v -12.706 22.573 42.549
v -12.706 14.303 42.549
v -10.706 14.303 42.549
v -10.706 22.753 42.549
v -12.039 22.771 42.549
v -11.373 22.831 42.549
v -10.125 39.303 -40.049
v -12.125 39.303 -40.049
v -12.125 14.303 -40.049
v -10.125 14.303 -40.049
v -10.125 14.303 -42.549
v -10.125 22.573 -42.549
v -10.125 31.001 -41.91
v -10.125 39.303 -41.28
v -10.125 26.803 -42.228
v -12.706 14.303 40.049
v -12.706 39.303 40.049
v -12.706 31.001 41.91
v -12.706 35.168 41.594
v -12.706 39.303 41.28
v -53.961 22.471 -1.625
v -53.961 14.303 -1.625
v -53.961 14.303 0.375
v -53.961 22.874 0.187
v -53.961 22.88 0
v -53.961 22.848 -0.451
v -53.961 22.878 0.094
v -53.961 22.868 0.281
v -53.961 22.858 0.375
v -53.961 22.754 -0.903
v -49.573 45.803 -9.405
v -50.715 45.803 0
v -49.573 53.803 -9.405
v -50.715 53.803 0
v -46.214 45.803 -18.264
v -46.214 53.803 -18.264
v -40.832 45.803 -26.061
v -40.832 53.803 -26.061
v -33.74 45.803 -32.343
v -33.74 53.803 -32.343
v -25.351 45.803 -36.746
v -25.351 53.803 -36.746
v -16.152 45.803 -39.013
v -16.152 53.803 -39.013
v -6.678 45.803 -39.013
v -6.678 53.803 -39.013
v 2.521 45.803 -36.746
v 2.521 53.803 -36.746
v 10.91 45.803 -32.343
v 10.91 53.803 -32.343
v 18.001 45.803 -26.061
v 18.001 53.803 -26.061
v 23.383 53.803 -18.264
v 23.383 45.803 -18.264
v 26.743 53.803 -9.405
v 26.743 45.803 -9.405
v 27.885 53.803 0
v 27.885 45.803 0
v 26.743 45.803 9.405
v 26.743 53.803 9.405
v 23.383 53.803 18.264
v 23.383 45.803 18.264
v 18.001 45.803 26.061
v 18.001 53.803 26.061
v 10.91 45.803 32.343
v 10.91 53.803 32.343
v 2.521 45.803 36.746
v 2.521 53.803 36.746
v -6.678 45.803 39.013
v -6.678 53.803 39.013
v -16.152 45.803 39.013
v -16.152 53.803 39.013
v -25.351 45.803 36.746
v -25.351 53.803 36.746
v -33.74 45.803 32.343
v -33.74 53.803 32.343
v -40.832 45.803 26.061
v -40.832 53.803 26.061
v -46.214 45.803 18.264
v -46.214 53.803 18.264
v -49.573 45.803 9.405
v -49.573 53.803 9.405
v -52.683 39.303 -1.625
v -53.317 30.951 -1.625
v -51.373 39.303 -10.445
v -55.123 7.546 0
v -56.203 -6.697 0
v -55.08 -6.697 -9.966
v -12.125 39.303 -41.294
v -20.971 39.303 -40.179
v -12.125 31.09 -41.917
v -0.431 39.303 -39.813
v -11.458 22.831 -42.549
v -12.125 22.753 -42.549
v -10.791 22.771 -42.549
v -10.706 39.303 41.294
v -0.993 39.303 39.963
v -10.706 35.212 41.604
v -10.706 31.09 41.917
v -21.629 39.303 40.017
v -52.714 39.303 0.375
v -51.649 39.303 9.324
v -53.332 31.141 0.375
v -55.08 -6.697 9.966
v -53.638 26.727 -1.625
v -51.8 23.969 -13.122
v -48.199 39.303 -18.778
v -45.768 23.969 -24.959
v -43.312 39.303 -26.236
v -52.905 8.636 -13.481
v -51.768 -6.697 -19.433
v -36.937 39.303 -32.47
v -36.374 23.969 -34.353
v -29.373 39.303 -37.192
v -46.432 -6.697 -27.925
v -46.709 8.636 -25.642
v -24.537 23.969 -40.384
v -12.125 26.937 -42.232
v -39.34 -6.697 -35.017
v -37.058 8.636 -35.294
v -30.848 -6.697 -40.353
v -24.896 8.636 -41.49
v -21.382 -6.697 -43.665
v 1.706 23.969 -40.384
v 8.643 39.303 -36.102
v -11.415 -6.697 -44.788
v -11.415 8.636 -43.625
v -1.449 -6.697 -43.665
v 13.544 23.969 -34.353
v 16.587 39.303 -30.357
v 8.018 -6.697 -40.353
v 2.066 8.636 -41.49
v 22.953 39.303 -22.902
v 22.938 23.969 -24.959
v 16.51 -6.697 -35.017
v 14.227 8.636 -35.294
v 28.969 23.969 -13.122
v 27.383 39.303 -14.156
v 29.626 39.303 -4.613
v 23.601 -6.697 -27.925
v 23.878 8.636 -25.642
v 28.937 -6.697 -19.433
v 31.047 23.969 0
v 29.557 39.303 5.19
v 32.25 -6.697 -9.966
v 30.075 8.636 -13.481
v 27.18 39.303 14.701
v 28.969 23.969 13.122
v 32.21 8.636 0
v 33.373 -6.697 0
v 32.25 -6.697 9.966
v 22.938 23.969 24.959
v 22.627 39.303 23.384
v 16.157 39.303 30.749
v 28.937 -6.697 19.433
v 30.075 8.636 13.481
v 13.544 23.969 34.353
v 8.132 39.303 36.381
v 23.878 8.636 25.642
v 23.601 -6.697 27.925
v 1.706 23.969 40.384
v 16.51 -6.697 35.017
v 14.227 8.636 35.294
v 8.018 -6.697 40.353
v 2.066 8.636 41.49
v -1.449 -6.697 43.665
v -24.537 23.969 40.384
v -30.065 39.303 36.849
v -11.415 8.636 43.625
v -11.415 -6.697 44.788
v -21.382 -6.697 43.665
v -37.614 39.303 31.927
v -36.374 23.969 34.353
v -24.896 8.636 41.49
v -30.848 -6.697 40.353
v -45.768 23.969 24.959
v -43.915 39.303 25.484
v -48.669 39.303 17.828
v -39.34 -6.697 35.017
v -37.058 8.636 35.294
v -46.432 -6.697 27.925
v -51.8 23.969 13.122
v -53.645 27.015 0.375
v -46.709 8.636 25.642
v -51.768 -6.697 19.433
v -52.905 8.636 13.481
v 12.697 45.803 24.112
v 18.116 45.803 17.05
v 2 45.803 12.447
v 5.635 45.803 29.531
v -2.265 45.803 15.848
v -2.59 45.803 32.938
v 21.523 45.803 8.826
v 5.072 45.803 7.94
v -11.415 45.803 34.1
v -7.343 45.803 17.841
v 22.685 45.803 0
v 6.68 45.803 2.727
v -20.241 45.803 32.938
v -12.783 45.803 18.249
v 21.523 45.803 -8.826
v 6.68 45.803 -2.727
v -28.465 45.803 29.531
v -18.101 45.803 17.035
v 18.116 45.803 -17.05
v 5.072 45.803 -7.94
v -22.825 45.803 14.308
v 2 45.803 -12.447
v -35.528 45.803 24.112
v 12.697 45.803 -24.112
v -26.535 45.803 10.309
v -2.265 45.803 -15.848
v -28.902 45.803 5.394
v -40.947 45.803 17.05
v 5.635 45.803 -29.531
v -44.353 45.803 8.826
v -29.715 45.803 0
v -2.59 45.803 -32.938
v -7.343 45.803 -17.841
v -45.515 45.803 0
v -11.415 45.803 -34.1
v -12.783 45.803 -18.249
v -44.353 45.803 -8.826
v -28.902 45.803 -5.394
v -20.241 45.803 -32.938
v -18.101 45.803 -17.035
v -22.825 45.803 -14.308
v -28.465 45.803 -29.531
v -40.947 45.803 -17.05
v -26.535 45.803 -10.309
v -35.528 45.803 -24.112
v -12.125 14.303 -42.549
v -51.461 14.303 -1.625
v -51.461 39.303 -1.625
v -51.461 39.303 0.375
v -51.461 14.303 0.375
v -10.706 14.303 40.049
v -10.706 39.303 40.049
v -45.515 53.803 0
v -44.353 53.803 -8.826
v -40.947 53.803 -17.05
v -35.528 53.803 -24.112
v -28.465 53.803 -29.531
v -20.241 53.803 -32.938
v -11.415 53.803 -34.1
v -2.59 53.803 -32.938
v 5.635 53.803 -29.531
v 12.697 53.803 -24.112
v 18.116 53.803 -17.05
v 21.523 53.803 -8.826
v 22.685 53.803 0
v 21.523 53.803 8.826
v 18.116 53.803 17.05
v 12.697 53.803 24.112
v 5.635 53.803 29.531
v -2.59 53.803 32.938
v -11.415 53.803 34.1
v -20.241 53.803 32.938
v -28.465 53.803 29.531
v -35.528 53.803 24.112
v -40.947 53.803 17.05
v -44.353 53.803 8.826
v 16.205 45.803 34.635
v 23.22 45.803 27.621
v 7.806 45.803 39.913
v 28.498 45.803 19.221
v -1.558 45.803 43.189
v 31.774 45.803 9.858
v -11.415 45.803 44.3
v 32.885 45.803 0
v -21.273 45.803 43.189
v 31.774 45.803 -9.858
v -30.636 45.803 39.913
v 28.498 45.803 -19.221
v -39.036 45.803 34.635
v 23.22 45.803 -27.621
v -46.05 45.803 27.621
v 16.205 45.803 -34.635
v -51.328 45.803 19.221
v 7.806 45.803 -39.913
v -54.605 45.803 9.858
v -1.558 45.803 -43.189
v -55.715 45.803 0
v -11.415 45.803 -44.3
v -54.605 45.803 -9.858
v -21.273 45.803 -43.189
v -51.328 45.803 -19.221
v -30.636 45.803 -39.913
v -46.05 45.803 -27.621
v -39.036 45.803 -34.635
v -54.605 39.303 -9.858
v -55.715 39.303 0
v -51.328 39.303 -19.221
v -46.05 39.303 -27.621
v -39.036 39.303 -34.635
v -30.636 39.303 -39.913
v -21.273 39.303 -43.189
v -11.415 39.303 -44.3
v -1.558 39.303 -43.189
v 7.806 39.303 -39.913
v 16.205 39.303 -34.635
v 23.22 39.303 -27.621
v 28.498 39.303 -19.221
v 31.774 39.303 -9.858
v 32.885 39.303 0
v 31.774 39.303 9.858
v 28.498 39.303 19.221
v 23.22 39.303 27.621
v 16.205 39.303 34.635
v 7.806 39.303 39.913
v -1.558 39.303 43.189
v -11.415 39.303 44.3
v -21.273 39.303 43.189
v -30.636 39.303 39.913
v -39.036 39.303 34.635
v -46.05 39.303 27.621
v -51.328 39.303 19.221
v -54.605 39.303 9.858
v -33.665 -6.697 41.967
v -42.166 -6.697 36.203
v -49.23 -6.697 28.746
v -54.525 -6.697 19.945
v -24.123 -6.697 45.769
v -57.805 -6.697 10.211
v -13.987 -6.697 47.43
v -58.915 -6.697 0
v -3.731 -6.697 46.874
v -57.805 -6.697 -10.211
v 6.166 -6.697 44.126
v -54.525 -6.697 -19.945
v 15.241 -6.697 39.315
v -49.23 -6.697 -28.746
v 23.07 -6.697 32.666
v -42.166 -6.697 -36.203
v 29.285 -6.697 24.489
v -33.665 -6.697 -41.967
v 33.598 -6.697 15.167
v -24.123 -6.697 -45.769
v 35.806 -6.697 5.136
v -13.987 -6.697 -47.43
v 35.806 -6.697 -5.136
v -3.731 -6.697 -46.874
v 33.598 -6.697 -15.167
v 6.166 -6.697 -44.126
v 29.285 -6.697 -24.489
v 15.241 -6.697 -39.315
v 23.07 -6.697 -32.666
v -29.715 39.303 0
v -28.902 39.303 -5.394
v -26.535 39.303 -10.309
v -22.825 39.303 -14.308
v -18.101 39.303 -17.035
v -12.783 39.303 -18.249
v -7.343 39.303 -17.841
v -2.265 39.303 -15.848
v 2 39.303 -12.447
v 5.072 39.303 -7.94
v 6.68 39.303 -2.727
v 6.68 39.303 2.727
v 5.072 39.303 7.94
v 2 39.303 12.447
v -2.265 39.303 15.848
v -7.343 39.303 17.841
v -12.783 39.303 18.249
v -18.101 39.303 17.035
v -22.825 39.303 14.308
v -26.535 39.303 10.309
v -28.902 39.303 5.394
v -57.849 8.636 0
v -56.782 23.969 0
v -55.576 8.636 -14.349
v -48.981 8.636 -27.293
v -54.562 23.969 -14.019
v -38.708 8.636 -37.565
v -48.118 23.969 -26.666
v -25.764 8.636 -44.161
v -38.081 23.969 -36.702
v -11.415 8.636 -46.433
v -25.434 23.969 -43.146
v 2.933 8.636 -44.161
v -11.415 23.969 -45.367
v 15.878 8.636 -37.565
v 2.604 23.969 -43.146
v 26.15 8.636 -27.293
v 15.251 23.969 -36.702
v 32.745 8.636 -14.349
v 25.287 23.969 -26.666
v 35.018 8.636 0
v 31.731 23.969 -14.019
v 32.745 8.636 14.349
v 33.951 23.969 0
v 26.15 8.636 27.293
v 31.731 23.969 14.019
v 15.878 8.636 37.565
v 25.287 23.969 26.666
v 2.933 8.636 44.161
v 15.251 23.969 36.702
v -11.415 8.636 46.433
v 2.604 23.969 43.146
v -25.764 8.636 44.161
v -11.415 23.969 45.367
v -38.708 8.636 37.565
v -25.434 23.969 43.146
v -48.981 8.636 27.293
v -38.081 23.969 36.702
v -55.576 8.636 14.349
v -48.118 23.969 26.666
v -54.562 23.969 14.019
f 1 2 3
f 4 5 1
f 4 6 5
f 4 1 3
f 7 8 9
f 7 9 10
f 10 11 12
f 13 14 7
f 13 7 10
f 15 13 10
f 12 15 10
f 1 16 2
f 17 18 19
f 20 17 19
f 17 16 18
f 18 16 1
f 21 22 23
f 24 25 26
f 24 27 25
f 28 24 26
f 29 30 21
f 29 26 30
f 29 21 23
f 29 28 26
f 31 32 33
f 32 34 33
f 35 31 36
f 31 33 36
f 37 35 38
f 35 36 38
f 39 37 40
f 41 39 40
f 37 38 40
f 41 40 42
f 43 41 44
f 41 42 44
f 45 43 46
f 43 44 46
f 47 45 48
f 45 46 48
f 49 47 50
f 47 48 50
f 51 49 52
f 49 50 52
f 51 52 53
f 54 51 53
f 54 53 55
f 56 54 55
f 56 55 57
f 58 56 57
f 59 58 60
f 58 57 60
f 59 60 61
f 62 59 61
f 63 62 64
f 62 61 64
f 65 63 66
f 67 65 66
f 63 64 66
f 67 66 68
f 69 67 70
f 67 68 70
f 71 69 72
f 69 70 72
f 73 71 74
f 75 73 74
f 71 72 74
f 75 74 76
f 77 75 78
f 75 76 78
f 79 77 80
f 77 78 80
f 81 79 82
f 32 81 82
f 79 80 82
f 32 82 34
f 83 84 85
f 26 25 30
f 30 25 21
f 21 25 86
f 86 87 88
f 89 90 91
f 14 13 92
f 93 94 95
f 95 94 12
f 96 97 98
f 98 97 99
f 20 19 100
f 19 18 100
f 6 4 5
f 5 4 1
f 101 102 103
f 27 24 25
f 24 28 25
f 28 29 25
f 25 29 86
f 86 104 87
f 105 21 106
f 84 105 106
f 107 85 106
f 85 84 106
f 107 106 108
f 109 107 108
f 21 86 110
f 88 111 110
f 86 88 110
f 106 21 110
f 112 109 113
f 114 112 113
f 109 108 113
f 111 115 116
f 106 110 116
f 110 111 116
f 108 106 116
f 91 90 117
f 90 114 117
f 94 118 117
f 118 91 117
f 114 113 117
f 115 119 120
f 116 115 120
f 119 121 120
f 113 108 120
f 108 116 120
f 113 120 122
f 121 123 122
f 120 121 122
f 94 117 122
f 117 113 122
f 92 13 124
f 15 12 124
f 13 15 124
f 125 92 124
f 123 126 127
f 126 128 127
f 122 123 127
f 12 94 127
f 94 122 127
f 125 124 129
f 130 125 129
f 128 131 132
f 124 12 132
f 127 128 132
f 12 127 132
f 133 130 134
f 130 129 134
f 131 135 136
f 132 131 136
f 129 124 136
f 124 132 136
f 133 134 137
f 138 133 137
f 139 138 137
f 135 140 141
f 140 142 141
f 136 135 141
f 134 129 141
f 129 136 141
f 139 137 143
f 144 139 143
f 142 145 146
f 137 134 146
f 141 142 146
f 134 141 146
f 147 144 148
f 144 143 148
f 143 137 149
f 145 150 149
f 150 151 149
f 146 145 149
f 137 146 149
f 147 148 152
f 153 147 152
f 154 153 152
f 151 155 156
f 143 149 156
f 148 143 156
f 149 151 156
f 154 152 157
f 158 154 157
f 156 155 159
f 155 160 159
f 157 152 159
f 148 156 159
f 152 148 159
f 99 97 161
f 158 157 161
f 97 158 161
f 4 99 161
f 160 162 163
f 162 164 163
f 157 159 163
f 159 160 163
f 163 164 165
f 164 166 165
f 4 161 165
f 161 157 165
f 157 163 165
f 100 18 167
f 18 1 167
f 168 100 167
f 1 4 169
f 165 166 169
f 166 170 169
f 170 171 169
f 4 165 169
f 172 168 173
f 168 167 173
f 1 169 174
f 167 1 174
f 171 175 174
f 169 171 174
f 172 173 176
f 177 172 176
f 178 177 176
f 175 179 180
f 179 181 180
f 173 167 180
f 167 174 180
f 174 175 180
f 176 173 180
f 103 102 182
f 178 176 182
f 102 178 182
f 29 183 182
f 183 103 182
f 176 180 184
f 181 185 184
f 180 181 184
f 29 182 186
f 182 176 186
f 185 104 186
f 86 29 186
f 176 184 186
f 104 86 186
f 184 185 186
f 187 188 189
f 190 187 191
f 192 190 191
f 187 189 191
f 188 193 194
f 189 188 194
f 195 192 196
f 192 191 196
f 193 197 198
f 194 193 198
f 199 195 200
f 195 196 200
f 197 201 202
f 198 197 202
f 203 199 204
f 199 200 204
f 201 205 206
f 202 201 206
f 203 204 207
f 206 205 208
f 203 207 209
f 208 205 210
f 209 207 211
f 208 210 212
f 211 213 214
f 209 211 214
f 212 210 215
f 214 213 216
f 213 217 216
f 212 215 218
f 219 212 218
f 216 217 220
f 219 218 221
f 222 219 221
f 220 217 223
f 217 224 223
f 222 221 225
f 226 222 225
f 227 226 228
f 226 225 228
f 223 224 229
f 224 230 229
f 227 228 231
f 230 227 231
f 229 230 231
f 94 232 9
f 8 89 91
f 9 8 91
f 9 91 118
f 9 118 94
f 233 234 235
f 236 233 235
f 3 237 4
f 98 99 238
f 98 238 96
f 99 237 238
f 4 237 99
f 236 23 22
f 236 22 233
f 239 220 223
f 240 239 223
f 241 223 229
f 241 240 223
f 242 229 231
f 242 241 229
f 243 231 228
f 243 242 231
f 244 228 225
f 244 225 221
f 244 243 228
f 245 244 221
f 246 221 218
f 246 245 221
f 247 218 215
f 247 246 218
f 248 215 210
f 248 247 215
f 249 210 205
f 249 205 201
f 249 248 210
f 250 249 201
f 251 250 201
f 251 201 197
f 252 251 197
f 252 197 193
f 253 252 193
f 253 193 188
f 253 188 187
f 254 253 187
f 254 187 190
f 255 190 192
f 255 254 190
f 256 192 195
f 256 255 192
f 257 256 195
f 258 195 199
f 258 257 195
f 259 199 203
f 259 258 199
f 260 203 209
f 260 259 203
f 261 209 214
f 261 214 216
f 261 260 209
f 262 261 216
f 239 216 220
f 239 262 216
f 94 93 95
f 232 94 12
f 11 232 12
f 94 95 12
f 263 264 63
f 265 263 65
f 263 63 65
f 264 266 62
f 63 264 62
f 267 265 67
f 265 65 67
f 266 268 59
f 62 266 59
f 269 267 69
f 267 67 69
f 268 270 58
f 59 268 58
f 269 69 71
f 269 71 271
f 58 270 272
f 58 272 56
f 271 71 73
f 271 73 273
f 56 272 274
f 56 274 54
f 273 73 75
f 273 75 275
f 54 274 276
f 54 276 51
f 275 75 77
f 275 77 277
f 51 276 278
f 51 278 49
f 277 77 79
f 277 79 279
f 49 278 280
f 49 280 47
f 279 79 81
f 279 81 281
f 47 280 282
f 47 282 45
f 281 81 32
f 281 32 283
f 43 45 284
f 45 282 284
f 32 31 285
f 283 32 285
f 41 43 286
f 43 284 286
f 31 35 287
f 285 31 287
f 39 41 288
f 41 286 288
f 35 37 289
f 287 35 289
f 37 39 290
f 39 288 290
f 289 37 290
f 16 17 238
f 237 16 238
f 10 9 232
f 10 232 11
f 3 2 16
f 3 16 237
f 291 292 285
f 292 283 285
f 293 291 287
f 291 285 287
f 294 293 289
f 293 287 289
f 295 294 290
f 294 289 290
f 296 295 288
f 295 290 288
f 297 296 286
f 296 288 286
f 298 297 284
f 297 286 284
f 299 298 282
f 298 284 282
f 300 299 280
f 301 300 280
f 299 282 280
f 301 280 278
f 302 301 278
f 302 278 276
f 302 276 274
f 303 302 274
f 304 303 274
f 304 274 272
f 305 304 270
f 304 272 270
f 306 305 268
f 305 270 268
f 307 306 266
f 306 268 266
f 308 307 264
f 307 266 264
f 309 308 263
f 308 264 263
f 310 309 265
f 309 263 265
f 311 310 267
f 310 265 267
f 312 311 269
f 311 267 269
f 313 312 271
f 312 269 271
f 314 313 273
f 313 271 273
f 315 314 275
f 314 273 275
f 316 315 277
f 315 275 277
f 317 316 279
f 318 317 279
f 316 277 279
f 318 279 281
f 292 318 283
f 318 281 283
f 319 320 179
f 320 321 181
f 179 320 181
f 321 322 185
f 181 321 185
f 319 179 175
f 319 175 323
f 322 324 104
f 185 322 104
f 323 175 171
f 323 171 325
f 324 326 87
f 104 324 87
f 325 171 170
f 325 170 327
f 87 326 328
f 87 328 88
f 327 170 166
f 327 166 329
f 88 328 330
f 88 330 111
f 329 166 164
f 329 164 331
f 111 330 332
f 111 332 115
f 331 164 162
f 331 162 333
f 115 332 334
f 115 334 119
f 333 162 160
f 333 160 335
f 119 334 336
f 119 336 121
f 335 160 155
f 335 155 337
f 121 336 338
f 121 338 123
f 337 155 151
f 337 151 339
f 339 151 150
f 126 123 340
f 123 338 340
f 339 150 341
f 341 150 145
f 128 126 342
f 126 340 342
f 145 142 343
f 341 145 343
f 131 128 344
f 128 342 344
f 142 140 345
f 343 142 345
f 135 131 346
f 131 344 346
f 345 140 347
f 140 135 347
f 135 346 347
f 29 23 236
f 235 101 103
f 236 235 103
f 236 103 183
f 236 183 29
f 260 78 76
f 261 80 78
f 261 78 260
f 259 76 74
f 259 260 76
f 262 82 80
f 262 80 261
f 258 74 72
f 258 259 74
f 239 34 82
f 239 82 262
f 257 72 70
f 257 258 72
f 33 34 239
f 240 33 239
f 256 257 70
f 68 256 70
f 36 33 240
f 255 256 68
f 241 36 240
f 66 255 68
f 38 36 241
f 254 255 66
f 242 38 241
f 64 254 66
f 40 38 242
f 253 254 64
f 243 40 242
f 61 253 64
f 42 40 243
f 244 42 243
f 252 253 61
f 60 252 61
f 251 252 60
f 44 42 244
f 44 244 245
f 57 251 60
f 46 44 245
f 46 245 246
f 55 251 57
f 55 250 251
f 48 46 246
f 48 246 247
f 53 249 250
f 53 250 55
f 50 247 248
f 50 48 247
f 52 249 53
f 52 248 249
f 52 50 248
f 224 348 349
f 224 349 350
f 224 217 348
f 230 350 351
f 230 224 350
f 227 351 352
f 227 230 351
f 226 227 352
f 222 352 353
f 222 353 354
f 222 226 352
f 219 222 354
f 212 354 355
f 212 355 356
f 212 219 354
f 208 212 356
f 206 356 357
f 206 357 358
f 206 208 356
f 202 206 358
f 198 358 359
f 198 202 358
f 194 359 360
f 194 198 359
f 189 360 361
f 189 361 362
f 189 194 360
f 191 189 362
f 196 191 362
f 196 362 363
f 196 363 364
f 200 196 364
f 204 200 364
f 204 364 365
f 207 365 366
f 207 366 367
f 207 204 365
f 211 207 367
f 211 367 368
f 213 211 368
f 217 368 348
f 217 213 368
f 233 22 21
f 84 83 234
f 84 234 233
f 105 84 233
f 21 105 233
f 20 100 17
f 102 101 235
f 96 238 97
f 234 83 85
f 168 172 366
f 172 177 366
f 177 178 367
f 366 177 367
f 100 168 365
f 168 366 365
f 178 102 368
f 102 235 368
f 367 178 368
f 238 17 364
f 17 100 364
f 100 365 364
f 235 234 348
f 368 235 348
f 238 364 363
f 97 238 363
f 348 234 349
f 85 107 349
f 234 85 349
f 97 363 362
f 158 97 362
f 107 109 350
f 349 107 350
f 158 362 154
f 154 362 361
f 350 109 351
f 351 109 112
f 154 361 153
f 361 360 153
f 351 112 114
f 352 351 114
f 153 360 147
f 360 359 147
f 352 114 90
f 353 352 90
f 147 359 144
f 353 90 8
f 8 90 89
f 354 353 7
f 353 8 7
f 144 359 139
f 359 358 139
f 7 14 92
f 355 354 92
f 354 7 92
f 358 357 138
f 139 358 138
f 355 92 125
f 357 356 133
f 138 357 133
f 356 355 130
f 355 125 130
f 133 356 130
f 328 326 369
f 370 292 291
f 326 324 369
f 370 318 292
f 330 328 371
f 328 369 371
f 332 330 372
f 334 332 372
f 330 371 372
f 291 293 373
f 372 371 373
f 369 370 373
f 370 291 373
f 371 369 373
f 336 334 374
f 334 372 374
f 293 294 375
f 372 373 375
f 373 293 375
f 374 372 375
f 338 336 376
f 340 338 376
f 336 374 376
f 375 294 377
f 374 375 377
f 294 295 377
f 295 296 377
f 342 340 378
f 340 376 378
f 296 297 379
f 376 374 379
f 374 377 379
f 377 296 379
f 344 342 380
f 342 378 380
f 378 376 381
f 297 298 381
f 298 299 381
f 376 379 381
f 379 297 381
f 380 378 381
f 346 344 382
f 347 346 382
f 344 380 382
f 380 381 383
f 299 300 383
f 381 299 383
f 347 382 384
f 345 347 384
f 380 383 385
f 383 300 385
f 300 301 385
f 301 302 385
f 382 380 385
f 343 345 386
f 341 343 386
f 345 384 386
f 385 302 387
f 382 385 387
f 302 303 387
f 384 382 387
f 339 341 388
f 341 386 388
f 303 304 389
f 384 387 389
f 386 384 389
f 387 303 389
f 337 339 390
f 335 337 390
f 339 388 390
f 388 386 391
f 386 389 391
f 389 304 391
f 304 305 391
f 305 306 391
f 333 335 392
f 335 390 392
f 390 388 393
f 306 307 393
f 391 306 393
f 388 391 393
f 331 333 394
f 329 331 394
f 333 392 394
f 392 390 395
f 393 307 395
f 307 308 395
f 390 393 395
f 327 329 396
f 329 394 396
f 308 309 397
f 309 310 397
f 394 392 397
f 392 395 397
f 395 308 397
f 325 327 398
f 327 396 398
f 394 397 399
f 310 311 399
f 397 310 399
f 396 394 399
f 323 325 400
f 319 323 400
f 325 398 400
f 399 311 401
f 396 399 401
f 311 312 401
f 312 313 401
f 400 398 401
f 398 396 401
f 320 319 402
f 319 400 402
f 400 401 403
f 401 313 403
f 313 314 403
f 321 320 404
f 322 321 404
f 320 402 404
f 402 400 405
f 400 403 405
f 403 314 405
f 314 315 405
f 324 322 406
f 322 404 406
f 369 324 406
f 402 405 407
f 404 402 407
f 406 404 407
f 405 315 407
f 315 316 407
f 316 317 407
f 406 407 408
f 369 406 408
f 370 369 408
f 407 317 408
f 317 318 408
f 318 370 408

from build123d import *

# Parameters (mm, degrees)
ESQUISSE1_W        = 15.8
ESQUISSE1_H        = 6.5
ESQUISSE1_W_2      = 5.2
ESQUISSE1_H_2      = 8
ESQUISSE2_W        = 2
ESQUISSE2_H        = 2.5
BOSS_EXTRU_2_DEPTH = 25
ESQUISSE3_W        = 2.5
ESQUISSE3_H        = 2
ESQUISSE3_W_2      = 2
ESQUISSE3_H_2      = 2.5
BOSS_EXTRU_3_DEPTH = 25


with BuildPart() as part:
    # Esquisse1 → Révolution1 (revolve)
    with BuildSketch(Plane.XY, mode=Mode.PRIVATE) as r_volution1_sk:
        Polygon((32.884729147, 39.302631579), (29.884729147, 39.302631579), (33.372699072, -6.697368421), (36.084729147, -6.697368421), align=None)
        Polygon((27.884729147, 45.802631579), (22.684729147, 45.802631579), (22.684729147, 39.302631579), (29.884729147, 39.302631579), (32.884729147, 39.302631579), (32.884729147, 45.802631579), align=None)
        with Locations((14.784729147, 42.552631579)):
            Rectangle(ESQUISSE1_W, ESQUISSE1_H)
        with Locations((25.284729147, 49.802631579)):
            Rectangle(ESQUISSE1_W_2, ESQUISSE1_H_2)
    revolve(r_volution1_sk.sketch.rotate(Axis((-11.415270853, 52.302631579, 0), (0, -1, 0)), 180), axis=Axis((-11.415270853, 52.302631579, 0), (0, -1, 0)))

    # Esquisse2 → Boss.-Extru.2 (add)
    with BuildSketch(Plane.XZ.offset(-39.302631579)):
        with Locations((-11.124553999, -41.298976788)):
            Rectangle(ESQUISSE2_W, ESQUISSE2_H)
    extrude(amount=BOSS_EXTRU_2_DEPTH)

    # Esquisse3 → Boss.-Extru.3 (add)
    with BuildSketch(Plane.XZ.offset(-39.302631579)):
        with Locations((-52.710541461, -0.6250003)):
            Rectangle(ESQUISSE3_W, ESQUISSE3_H)
        with Locations((-11.706072968, 41.298976187)):
            Rectangle(ESQUISSE3_W_2, ESQUISSE3_H_2)
    extrude(amount=BOSS_EXTRU_3_DEPTH)


solid = part.part
